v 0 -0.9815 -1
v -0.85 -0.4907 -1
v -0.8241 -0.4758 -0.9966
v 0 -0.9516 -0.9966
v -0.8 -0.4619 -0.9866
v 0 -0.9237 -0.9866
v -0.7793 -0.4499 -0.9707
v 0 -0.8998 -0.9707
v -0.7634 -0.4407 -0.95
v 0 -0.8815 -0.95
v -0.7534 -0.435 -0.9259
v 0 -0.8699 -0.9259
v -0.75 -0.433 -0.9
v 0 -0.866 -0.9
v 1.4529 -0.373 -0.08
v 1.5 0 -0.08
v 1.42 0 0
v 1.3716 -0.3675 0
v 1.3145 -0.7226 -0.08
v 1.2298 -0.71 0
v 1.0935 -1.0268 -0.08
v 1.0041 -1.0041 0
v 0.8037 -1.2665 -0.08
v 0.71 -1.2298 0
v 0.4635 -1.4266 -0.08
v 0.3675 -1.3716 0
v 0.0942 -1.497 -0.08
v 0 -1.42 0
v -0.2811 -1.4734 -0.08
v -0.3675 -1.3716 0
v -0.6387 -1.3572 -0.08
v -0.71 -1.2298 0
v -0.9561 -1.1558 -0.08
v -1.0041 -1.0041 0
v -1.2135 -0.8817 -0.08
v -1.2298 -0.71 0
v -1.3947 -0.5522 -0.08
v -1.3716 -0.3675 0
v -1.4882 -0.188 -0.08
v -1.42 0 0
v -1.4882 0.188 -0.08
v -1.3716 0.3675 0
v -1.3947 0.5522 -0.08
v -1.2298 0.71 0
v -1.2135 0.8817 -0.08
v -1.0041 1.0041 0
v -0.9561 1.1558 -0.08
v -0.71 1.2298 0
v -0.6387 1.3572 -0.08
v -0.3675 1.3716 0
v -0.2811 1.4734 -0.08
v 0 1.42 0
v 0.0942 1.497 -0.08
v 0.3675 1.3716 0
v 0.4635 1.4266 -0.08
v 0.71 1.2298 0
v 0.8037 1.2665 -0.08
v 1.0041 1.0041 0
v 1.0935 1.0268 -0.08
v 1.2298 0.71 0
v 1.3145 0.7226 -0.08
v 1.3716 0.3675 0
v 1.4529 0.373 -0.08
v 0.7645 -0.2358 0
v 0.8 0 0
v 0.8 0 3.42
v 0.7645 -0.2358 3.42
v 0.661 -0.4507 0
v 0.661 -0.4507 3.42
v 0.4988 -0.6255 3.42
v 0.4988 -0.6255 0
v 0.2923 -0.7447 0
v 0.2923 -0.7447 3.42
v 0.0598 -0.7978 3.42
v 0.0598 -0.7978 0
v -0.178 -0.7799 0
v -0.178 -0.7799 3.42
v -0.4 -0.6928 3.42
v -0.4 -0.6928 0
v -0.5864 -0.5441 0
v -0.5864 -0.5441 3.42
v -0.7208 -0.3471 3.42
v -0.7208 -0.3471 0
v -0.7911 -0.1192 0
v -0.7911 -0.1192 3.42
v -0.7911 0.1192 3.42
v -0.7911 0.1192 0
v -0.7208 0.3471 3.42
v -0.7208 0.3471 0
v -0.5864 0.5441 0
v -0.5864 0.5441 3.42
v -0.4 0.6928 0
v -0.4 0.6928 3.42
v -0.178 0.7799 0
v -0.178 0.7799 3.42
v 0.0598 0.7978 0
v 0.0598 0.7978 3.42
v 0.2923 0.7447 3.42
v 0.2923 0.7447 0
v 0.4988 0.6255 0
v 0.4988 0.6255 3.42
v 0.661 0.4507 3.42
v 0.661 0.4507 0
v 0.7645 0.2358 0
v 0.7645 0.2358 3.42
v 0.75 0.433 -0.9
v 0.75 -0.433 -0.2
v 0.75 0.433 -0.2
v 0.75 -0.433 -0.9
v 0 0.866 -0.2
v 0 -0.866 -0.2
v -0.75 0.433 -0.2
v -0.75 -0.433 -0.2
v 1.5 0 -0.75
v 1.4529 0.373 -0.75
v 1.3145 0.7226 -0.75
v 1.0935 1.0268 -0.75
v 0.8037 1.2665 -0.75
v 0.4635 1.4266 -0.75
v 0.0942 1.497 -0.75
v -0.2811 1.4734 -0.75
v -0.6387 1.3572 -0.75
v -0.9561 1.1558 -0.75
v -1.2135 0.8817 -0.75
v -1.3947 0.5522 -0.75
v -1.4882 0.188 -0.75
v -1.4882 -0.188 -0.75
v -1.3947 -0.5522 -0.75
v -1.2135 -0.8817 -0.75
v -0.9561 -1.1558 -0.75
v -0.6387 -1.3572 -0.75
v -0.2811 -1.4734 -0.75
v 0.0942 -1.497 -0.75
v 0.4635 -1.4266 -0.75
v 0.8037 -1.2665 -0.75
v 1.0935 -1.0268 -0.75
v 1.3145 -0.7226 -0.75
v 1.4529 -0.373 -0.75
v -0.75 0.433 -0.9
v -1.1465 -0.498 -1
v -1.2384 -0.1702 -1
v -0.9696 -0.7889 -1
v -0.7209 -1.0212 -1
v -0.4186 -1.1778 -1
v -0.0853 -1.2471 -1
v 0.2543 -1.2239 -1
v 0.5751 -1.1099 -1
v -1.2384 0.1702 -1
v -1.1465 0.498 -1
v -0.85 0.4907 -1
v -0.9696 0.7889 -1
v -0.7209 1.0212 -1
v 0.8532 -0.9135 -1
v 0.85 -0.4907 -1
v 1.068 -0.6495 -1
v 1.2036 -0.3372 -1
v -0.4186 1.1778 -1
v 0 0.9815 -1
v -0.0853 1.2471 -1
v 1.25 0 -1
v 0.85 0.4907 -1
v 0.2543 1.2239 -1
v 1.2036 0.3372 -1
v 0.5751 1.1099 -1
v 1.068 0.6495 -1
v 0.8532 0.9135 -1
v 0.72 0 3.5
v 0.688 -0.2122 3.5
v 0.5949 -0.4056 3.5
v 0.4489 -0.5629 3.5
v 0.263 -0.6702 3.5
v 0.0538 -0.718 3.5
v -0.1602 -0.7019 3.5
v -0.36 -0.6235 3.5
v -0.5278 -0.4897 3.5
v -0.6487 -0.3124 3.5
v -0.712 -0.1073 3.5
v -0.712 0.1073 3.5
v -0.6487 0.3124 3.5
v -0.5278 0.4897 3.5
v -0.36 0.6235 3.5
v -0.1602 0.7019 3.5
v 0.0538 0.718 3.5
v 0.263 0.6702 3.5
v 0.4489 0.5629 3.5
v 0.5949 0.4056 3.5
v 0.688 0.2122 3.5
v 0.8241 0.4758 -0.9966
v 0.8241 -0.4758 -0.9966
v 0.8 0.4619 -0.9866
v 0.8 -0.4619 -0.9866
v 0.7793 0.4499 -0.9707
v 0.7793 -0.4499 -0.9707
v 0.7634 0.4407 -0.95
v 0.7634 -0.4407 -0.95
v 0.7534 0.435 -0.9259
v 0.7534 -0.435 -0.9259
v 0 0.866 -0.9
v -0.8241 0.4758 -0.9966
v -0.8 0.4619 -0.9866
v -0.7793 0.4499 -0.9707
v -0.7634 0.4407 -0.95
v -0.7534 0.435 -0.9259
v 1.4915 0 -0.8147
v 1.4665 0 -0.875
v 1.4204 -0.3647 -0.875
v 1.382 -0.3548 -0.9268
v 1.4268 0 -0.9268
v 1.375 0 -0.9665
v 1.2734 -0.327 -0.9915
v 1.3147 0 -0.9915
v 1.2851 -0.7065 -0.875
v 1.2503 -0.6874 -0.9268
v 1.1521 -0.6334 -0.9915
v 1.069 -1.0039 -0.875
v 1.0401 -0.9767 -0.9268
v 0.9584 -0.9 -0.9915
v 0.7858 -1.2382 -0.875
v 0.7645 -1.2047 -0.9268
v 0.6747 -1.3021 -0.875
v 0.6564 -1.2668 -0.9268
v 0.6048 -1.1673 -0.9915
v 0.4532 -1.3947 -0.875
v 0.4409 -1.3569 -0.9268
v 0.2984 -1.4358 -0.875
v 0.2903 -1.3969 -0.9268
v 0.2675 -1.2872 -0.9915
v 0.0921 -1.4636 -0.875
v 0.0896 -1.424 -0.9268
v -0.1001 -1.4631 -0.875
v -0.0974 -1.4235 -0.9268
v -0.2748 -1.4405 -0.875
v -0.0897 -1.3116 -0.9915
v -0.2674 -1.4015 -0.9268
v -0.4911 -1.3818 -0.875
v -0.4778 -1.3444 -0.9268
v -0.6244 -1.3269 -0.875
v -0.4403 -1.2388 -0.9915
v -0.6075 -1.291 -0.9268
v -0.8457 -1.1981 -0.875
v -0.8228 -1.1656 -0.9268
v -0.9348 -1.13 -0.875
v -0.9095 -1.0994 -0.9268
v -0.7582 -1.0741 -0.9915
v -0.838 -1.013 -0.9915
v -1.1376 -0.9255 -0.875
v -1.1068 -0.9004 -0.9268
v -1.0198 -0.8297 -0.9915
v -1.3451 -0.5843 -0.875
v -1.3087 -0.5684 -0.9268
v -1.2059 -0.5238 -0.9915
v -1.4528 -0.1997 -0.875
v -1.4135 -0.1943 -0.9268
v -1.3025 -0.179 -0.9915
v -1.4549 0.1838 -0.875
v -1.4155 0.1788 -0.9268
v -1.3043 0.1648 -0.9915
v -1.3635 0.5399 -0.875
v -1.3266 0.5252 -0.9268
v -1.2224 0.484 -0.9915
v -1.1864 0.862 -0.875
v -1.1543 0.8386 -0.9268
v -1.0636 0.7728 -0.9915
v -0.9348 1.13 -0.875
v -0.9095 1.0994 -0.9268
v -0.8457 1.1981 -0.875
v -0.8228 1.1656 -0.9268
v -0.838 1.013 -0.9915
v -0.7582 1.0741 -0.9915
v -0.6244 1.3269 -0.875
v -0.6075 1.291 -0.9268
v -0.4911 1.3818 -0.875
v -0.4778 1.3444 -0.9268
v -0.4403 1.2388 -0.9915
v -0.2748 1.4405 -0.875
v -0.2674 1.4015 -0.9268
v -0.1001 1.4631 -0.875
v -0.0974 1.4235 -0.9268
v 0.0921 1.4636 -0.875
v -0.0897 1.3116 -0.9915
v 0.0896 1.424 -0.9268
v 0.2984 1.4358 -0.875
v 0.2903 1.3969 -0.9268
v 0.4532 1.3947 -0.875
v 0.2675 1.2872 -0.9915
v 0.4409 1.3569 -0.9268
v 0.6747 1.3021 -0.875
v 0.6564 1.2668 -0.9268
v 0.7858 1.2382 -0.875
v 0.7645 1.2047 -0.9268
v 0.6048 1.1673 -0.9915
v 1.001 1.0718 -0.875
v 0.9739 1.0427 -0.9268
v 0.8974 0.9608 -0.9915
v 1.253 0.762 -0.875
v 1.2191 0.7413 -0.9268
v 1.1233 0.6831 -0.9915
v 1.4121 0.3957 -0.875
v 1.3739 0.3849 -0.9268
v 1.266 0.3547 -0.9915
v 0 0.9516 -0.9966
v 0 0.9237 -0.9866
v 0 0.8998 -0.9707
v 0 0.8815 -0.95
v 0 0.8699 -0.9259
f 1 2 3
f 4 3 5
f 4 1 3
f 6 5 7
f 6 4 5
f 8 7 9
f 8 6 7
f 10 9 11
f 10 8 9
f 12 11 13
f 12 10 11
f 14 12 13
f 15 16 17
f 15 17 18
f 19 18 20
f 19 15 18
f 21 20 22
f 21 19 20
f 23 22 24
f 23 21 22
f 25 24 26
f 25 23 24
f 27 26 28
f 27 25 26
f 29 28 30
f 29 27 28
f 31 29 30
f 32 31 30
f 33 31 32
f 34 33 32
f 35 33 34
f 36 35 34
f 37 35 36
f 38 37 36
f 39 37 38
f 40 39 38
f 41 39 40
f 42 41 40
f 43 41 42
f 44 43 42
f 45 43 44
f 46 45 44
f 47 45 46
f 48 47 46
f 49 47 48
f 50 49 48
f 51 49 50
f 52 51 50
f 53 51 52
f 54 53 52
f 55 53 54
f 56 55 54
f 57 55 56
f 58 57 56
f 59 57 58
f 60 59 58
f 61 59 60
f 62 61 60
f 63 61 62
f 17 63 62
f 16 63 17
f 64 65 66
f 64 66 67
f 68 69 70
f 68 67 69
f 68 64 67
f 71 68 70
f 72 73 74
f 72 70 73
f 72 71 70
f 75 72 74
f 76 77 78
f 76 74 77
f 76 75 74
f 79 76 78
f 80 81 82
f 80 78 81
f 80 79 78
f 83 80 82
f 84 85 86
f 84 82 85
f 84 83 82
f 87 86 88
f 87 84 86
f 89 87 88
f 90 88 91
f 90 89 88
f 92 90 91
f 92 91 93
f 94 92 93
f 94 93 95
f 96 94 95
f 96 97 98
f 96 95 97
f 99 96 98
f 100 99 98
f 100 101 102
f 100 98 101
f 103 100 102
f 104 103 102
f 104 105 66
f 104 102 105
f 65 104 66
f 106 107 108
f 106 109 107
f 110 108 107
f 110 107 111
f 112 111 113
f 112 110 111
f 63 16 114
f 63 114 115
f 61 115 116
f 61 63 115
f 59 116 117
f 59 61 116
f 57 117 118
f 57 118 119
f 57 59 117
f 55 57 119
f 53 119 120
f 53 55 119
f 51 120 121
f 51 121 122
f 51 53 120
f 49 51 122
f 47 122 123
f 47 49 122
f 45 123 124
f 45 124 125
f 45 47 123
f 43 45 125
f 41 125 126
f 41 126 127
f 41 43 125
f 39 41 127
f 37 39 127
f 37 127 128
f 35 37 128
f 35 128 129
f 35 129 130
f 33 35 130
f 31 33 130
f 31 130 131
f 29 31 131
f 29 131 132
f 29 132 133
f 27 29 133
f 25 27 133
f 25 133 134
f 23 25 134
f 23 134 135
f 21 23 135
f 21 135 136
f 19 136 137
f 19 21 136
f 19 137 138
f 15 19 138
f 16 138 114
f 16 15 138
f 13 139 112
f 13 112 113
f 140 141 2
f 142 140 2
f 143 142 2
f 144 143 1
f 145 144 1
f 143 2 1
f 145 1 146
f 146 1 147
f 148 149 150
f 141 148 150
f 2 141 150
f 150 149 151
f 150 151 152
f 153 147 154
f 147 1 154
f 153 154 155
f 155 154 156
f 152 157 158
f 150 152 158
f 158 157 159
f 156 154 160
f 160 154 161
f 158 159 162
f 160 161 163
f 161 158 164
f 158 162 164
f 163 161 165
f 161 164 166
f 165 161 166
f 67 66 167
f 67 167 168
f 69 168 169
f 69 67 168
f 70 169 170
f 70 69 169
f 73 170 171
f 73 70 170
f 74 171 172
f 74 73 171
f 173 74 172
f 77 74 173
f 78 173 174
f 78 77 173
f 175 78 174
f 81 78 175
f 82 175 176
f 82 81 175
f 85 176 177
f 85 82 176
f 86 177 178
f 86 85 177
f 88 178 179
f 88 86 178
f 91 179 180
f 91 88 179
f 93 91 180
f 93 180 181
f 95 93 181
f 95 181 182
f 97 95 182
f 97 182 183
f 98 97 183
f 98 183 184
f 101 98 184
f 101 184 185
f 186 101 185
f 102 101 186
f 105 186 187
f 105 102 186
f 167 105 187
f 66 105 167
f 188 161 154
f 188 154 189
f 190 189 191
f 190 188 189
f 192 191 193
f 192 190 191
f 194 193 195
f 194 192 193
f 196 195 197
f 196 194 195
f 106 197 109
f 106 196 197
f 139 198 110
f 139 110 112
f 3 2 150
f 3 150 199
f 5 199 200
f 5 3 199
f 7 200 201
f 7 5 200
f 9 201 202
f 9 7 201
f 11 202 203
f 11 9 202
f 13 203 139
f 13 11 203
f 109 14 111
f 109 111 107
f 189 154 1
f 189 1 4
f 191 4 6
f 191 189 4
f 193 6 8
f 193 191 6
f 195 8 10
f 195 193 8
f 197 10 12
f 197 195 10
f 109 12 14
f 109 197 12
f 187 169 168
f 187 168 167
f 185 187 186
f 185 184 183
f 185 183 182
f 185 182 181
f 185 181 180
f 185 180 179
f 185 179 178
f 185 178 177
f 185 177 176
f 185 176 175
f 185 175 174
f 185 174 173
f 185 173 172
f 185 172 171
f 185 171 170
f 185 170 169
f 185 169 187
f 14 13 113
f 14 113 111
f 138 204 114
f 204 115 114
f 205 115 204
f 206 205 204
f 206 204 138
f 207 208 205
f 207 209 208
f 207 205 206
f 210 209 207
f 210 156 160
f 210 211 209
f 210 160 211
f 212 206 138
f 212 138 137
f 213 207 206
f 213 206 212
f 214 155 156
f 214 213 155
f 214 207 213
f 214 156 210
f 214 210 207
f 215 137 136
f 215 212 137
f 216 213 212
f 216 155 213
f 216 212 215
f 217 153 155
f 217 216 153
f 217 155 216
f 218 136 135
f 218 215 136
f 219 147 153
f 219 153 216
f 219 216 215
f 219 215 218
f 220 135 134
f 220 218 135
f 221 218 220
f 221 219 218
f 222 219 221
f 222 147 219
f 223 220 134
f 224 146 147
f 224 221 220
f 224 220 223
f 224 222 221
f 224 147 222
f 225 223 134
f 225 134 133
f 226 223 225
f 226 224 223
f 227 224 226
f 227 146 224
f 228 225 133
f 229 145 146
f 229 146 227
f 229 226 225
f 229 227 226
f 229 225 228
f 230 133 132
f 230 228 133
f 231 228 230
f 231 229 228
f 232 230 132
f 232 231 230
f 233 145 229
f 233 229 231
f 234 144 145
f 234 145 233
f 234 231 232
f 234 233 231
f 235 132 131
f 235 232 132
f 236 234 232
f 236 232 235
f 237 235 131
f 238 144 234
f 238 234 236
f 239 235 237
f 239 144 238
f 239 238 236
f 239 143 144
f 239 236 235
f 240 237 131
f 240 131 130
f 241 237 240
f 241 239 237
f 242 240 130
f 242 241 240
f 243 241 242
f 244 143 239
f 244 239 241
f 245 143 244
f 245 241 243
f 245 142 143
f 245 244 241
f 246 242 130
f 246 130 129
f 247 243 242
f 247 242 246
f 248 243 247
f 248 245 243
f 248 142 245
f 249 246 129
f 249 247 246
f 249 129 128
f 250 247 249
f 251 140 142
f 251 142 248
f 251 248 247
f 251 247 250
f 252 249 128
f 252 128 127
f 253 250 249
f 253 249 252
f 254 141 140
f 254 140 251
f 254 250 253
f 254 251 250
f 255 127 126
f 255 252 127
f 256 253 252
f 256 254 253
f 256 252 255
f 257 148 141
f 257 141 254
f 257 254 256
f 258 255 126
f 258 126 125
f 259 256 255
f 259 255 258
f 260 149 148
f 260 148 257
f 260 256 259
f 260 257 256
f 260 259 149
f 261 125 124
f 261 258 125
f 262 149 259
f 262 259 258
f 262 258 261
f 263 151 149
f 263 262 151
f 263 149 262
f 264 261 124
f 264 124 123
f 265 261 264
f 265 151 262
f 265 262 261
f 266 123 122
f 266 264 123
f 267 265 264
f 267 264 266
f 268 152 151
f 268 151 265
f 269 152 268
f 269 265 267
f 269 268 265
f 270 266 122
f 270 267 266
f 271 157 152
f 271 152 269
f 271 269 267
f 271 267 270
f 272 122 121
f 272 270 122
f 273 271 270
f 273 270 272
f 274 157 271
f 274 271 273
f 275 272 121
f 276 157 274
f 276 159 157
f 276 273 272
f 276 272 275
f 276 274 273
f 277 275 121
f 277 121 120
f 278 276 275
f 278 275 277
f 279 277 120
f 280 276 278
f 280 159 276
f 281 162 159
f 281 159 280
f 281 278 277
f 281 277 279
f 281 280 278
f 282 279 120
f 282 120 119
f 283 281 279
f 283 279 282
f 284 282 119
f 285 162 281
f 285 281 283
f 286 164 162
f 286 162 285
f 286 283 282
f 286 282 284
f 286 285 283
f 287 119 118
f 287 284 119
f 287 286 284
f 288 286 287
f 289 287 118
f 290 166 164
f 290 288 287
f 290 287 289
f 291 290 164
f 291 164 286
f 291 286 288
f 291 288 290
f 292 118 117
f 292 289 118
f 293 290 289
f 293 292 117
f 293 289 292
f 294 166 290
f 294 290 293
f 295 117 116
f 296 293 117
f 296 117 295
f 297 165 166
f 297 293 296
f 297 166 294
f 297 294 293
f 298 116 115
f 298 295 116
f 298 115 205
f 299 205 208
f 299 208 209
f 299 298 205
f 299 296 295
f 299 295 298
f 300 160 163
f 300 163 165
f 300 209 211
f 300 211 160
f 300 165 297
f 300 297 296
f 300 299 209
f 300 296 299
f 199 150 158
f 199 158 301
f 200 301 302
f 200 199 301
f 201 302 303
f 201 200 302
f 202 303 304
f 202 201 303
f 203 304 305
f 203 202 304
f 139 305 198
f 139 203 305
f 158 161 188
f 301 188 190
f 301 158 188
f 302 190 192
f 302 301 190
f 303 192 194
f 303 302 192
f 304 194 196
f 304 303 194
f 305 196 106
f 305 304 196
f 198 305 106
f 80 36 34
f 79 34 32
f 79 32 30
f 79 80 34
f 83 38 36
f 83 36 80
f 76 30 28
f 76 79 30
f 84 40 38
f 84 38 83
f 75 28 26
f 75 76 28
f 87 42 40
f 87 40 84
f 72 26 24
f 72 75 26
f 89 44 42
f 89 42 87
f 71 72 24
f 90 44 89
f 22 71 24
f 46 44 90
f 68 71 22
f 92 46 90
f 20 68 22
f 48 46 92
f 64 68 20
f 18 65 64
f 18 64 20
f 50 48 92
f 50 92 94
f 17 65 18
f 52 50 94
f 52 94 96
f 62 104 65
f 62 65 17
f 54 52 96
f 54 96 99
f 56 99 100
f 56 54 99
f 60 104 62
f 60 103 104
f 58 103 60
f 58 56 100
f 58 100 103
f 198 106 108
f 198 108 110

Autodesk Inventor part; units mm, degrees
ref_plane "YZ Plane" through (0, 0, 0) normal (1, 0, 0) x (0, 1, 0)
ref_plane "XZ Plane" through (0, 0, 0) normal (0, 1, 0) x (-1, 0, 0)
ref_plane "XY Plane" through (0, 0, 0) normal (0, 0, 1) x (1, 0, 0)
sketch "Sketch1" plane through (0, 0, 0) normal (0, 0, 1) x (1, 0, 0)
  circle A0 centre (0, 0) radius 0.8
  circle A1 centre (0, 0) radius 1.5
  dimension "d0" = 1.6
  dimension "d1" = 3
extrude "Extrusion1" add sketch "Sketch1" along normal blind 3.5 contours A0
extrude "Extrusion2" add sketch "Sketch1" against normal blind 1 contours A0 | A1
sketch "Sketch2" plane through (0, 0, -1) normal (0, 0, -1) x (-1, 0, 0)
  line L0 (-0.75, 0.433) -> (0, 0.866)
  line L1 (0, 0.866) -> (0.75, 0.433)
  line L2 (0.75, 0.433) -> (0.75, -0.433)
  line L3 (0.75, -0.433) -> (0, -0.866)
  line L4 (0, -0.866) -> (-0.75, -0.433)
  line L5 (-0.75, -0.433) -> (-0.75, 0.433)
  point P0 (0, 0)
  point P1 (0, 0)
  dimension "d6" = 1.5
extrude "Extrusion3" cut sketch "Sketch2" against normal blind 0.8
fillet "Fillet1" radius 0.25 1 edges at (-1.5, 0, -1)
fillet "Fillet1" radius 0.1 6 edges at (0.375, 0.6495, -1) (0.75, 0, -1) (0.375, -0.6495, -1) (-0.375, -0.6495, -1) (-0.75, 0, -1) (-0.375, 0.6495, -1)
thread "Thread1" size "M1.6x0.35" class "6g" standard "ANSI Metric M Profile" full length
chamfer "Chamfer1" distance 0.08 angle 45 2 edges at (-0.8, 0, 3.5) (-1.5, 0, 0)
properties part number "CNCT_STEEL_M1,6x3,5_Screw" material "Stainless Steel"
